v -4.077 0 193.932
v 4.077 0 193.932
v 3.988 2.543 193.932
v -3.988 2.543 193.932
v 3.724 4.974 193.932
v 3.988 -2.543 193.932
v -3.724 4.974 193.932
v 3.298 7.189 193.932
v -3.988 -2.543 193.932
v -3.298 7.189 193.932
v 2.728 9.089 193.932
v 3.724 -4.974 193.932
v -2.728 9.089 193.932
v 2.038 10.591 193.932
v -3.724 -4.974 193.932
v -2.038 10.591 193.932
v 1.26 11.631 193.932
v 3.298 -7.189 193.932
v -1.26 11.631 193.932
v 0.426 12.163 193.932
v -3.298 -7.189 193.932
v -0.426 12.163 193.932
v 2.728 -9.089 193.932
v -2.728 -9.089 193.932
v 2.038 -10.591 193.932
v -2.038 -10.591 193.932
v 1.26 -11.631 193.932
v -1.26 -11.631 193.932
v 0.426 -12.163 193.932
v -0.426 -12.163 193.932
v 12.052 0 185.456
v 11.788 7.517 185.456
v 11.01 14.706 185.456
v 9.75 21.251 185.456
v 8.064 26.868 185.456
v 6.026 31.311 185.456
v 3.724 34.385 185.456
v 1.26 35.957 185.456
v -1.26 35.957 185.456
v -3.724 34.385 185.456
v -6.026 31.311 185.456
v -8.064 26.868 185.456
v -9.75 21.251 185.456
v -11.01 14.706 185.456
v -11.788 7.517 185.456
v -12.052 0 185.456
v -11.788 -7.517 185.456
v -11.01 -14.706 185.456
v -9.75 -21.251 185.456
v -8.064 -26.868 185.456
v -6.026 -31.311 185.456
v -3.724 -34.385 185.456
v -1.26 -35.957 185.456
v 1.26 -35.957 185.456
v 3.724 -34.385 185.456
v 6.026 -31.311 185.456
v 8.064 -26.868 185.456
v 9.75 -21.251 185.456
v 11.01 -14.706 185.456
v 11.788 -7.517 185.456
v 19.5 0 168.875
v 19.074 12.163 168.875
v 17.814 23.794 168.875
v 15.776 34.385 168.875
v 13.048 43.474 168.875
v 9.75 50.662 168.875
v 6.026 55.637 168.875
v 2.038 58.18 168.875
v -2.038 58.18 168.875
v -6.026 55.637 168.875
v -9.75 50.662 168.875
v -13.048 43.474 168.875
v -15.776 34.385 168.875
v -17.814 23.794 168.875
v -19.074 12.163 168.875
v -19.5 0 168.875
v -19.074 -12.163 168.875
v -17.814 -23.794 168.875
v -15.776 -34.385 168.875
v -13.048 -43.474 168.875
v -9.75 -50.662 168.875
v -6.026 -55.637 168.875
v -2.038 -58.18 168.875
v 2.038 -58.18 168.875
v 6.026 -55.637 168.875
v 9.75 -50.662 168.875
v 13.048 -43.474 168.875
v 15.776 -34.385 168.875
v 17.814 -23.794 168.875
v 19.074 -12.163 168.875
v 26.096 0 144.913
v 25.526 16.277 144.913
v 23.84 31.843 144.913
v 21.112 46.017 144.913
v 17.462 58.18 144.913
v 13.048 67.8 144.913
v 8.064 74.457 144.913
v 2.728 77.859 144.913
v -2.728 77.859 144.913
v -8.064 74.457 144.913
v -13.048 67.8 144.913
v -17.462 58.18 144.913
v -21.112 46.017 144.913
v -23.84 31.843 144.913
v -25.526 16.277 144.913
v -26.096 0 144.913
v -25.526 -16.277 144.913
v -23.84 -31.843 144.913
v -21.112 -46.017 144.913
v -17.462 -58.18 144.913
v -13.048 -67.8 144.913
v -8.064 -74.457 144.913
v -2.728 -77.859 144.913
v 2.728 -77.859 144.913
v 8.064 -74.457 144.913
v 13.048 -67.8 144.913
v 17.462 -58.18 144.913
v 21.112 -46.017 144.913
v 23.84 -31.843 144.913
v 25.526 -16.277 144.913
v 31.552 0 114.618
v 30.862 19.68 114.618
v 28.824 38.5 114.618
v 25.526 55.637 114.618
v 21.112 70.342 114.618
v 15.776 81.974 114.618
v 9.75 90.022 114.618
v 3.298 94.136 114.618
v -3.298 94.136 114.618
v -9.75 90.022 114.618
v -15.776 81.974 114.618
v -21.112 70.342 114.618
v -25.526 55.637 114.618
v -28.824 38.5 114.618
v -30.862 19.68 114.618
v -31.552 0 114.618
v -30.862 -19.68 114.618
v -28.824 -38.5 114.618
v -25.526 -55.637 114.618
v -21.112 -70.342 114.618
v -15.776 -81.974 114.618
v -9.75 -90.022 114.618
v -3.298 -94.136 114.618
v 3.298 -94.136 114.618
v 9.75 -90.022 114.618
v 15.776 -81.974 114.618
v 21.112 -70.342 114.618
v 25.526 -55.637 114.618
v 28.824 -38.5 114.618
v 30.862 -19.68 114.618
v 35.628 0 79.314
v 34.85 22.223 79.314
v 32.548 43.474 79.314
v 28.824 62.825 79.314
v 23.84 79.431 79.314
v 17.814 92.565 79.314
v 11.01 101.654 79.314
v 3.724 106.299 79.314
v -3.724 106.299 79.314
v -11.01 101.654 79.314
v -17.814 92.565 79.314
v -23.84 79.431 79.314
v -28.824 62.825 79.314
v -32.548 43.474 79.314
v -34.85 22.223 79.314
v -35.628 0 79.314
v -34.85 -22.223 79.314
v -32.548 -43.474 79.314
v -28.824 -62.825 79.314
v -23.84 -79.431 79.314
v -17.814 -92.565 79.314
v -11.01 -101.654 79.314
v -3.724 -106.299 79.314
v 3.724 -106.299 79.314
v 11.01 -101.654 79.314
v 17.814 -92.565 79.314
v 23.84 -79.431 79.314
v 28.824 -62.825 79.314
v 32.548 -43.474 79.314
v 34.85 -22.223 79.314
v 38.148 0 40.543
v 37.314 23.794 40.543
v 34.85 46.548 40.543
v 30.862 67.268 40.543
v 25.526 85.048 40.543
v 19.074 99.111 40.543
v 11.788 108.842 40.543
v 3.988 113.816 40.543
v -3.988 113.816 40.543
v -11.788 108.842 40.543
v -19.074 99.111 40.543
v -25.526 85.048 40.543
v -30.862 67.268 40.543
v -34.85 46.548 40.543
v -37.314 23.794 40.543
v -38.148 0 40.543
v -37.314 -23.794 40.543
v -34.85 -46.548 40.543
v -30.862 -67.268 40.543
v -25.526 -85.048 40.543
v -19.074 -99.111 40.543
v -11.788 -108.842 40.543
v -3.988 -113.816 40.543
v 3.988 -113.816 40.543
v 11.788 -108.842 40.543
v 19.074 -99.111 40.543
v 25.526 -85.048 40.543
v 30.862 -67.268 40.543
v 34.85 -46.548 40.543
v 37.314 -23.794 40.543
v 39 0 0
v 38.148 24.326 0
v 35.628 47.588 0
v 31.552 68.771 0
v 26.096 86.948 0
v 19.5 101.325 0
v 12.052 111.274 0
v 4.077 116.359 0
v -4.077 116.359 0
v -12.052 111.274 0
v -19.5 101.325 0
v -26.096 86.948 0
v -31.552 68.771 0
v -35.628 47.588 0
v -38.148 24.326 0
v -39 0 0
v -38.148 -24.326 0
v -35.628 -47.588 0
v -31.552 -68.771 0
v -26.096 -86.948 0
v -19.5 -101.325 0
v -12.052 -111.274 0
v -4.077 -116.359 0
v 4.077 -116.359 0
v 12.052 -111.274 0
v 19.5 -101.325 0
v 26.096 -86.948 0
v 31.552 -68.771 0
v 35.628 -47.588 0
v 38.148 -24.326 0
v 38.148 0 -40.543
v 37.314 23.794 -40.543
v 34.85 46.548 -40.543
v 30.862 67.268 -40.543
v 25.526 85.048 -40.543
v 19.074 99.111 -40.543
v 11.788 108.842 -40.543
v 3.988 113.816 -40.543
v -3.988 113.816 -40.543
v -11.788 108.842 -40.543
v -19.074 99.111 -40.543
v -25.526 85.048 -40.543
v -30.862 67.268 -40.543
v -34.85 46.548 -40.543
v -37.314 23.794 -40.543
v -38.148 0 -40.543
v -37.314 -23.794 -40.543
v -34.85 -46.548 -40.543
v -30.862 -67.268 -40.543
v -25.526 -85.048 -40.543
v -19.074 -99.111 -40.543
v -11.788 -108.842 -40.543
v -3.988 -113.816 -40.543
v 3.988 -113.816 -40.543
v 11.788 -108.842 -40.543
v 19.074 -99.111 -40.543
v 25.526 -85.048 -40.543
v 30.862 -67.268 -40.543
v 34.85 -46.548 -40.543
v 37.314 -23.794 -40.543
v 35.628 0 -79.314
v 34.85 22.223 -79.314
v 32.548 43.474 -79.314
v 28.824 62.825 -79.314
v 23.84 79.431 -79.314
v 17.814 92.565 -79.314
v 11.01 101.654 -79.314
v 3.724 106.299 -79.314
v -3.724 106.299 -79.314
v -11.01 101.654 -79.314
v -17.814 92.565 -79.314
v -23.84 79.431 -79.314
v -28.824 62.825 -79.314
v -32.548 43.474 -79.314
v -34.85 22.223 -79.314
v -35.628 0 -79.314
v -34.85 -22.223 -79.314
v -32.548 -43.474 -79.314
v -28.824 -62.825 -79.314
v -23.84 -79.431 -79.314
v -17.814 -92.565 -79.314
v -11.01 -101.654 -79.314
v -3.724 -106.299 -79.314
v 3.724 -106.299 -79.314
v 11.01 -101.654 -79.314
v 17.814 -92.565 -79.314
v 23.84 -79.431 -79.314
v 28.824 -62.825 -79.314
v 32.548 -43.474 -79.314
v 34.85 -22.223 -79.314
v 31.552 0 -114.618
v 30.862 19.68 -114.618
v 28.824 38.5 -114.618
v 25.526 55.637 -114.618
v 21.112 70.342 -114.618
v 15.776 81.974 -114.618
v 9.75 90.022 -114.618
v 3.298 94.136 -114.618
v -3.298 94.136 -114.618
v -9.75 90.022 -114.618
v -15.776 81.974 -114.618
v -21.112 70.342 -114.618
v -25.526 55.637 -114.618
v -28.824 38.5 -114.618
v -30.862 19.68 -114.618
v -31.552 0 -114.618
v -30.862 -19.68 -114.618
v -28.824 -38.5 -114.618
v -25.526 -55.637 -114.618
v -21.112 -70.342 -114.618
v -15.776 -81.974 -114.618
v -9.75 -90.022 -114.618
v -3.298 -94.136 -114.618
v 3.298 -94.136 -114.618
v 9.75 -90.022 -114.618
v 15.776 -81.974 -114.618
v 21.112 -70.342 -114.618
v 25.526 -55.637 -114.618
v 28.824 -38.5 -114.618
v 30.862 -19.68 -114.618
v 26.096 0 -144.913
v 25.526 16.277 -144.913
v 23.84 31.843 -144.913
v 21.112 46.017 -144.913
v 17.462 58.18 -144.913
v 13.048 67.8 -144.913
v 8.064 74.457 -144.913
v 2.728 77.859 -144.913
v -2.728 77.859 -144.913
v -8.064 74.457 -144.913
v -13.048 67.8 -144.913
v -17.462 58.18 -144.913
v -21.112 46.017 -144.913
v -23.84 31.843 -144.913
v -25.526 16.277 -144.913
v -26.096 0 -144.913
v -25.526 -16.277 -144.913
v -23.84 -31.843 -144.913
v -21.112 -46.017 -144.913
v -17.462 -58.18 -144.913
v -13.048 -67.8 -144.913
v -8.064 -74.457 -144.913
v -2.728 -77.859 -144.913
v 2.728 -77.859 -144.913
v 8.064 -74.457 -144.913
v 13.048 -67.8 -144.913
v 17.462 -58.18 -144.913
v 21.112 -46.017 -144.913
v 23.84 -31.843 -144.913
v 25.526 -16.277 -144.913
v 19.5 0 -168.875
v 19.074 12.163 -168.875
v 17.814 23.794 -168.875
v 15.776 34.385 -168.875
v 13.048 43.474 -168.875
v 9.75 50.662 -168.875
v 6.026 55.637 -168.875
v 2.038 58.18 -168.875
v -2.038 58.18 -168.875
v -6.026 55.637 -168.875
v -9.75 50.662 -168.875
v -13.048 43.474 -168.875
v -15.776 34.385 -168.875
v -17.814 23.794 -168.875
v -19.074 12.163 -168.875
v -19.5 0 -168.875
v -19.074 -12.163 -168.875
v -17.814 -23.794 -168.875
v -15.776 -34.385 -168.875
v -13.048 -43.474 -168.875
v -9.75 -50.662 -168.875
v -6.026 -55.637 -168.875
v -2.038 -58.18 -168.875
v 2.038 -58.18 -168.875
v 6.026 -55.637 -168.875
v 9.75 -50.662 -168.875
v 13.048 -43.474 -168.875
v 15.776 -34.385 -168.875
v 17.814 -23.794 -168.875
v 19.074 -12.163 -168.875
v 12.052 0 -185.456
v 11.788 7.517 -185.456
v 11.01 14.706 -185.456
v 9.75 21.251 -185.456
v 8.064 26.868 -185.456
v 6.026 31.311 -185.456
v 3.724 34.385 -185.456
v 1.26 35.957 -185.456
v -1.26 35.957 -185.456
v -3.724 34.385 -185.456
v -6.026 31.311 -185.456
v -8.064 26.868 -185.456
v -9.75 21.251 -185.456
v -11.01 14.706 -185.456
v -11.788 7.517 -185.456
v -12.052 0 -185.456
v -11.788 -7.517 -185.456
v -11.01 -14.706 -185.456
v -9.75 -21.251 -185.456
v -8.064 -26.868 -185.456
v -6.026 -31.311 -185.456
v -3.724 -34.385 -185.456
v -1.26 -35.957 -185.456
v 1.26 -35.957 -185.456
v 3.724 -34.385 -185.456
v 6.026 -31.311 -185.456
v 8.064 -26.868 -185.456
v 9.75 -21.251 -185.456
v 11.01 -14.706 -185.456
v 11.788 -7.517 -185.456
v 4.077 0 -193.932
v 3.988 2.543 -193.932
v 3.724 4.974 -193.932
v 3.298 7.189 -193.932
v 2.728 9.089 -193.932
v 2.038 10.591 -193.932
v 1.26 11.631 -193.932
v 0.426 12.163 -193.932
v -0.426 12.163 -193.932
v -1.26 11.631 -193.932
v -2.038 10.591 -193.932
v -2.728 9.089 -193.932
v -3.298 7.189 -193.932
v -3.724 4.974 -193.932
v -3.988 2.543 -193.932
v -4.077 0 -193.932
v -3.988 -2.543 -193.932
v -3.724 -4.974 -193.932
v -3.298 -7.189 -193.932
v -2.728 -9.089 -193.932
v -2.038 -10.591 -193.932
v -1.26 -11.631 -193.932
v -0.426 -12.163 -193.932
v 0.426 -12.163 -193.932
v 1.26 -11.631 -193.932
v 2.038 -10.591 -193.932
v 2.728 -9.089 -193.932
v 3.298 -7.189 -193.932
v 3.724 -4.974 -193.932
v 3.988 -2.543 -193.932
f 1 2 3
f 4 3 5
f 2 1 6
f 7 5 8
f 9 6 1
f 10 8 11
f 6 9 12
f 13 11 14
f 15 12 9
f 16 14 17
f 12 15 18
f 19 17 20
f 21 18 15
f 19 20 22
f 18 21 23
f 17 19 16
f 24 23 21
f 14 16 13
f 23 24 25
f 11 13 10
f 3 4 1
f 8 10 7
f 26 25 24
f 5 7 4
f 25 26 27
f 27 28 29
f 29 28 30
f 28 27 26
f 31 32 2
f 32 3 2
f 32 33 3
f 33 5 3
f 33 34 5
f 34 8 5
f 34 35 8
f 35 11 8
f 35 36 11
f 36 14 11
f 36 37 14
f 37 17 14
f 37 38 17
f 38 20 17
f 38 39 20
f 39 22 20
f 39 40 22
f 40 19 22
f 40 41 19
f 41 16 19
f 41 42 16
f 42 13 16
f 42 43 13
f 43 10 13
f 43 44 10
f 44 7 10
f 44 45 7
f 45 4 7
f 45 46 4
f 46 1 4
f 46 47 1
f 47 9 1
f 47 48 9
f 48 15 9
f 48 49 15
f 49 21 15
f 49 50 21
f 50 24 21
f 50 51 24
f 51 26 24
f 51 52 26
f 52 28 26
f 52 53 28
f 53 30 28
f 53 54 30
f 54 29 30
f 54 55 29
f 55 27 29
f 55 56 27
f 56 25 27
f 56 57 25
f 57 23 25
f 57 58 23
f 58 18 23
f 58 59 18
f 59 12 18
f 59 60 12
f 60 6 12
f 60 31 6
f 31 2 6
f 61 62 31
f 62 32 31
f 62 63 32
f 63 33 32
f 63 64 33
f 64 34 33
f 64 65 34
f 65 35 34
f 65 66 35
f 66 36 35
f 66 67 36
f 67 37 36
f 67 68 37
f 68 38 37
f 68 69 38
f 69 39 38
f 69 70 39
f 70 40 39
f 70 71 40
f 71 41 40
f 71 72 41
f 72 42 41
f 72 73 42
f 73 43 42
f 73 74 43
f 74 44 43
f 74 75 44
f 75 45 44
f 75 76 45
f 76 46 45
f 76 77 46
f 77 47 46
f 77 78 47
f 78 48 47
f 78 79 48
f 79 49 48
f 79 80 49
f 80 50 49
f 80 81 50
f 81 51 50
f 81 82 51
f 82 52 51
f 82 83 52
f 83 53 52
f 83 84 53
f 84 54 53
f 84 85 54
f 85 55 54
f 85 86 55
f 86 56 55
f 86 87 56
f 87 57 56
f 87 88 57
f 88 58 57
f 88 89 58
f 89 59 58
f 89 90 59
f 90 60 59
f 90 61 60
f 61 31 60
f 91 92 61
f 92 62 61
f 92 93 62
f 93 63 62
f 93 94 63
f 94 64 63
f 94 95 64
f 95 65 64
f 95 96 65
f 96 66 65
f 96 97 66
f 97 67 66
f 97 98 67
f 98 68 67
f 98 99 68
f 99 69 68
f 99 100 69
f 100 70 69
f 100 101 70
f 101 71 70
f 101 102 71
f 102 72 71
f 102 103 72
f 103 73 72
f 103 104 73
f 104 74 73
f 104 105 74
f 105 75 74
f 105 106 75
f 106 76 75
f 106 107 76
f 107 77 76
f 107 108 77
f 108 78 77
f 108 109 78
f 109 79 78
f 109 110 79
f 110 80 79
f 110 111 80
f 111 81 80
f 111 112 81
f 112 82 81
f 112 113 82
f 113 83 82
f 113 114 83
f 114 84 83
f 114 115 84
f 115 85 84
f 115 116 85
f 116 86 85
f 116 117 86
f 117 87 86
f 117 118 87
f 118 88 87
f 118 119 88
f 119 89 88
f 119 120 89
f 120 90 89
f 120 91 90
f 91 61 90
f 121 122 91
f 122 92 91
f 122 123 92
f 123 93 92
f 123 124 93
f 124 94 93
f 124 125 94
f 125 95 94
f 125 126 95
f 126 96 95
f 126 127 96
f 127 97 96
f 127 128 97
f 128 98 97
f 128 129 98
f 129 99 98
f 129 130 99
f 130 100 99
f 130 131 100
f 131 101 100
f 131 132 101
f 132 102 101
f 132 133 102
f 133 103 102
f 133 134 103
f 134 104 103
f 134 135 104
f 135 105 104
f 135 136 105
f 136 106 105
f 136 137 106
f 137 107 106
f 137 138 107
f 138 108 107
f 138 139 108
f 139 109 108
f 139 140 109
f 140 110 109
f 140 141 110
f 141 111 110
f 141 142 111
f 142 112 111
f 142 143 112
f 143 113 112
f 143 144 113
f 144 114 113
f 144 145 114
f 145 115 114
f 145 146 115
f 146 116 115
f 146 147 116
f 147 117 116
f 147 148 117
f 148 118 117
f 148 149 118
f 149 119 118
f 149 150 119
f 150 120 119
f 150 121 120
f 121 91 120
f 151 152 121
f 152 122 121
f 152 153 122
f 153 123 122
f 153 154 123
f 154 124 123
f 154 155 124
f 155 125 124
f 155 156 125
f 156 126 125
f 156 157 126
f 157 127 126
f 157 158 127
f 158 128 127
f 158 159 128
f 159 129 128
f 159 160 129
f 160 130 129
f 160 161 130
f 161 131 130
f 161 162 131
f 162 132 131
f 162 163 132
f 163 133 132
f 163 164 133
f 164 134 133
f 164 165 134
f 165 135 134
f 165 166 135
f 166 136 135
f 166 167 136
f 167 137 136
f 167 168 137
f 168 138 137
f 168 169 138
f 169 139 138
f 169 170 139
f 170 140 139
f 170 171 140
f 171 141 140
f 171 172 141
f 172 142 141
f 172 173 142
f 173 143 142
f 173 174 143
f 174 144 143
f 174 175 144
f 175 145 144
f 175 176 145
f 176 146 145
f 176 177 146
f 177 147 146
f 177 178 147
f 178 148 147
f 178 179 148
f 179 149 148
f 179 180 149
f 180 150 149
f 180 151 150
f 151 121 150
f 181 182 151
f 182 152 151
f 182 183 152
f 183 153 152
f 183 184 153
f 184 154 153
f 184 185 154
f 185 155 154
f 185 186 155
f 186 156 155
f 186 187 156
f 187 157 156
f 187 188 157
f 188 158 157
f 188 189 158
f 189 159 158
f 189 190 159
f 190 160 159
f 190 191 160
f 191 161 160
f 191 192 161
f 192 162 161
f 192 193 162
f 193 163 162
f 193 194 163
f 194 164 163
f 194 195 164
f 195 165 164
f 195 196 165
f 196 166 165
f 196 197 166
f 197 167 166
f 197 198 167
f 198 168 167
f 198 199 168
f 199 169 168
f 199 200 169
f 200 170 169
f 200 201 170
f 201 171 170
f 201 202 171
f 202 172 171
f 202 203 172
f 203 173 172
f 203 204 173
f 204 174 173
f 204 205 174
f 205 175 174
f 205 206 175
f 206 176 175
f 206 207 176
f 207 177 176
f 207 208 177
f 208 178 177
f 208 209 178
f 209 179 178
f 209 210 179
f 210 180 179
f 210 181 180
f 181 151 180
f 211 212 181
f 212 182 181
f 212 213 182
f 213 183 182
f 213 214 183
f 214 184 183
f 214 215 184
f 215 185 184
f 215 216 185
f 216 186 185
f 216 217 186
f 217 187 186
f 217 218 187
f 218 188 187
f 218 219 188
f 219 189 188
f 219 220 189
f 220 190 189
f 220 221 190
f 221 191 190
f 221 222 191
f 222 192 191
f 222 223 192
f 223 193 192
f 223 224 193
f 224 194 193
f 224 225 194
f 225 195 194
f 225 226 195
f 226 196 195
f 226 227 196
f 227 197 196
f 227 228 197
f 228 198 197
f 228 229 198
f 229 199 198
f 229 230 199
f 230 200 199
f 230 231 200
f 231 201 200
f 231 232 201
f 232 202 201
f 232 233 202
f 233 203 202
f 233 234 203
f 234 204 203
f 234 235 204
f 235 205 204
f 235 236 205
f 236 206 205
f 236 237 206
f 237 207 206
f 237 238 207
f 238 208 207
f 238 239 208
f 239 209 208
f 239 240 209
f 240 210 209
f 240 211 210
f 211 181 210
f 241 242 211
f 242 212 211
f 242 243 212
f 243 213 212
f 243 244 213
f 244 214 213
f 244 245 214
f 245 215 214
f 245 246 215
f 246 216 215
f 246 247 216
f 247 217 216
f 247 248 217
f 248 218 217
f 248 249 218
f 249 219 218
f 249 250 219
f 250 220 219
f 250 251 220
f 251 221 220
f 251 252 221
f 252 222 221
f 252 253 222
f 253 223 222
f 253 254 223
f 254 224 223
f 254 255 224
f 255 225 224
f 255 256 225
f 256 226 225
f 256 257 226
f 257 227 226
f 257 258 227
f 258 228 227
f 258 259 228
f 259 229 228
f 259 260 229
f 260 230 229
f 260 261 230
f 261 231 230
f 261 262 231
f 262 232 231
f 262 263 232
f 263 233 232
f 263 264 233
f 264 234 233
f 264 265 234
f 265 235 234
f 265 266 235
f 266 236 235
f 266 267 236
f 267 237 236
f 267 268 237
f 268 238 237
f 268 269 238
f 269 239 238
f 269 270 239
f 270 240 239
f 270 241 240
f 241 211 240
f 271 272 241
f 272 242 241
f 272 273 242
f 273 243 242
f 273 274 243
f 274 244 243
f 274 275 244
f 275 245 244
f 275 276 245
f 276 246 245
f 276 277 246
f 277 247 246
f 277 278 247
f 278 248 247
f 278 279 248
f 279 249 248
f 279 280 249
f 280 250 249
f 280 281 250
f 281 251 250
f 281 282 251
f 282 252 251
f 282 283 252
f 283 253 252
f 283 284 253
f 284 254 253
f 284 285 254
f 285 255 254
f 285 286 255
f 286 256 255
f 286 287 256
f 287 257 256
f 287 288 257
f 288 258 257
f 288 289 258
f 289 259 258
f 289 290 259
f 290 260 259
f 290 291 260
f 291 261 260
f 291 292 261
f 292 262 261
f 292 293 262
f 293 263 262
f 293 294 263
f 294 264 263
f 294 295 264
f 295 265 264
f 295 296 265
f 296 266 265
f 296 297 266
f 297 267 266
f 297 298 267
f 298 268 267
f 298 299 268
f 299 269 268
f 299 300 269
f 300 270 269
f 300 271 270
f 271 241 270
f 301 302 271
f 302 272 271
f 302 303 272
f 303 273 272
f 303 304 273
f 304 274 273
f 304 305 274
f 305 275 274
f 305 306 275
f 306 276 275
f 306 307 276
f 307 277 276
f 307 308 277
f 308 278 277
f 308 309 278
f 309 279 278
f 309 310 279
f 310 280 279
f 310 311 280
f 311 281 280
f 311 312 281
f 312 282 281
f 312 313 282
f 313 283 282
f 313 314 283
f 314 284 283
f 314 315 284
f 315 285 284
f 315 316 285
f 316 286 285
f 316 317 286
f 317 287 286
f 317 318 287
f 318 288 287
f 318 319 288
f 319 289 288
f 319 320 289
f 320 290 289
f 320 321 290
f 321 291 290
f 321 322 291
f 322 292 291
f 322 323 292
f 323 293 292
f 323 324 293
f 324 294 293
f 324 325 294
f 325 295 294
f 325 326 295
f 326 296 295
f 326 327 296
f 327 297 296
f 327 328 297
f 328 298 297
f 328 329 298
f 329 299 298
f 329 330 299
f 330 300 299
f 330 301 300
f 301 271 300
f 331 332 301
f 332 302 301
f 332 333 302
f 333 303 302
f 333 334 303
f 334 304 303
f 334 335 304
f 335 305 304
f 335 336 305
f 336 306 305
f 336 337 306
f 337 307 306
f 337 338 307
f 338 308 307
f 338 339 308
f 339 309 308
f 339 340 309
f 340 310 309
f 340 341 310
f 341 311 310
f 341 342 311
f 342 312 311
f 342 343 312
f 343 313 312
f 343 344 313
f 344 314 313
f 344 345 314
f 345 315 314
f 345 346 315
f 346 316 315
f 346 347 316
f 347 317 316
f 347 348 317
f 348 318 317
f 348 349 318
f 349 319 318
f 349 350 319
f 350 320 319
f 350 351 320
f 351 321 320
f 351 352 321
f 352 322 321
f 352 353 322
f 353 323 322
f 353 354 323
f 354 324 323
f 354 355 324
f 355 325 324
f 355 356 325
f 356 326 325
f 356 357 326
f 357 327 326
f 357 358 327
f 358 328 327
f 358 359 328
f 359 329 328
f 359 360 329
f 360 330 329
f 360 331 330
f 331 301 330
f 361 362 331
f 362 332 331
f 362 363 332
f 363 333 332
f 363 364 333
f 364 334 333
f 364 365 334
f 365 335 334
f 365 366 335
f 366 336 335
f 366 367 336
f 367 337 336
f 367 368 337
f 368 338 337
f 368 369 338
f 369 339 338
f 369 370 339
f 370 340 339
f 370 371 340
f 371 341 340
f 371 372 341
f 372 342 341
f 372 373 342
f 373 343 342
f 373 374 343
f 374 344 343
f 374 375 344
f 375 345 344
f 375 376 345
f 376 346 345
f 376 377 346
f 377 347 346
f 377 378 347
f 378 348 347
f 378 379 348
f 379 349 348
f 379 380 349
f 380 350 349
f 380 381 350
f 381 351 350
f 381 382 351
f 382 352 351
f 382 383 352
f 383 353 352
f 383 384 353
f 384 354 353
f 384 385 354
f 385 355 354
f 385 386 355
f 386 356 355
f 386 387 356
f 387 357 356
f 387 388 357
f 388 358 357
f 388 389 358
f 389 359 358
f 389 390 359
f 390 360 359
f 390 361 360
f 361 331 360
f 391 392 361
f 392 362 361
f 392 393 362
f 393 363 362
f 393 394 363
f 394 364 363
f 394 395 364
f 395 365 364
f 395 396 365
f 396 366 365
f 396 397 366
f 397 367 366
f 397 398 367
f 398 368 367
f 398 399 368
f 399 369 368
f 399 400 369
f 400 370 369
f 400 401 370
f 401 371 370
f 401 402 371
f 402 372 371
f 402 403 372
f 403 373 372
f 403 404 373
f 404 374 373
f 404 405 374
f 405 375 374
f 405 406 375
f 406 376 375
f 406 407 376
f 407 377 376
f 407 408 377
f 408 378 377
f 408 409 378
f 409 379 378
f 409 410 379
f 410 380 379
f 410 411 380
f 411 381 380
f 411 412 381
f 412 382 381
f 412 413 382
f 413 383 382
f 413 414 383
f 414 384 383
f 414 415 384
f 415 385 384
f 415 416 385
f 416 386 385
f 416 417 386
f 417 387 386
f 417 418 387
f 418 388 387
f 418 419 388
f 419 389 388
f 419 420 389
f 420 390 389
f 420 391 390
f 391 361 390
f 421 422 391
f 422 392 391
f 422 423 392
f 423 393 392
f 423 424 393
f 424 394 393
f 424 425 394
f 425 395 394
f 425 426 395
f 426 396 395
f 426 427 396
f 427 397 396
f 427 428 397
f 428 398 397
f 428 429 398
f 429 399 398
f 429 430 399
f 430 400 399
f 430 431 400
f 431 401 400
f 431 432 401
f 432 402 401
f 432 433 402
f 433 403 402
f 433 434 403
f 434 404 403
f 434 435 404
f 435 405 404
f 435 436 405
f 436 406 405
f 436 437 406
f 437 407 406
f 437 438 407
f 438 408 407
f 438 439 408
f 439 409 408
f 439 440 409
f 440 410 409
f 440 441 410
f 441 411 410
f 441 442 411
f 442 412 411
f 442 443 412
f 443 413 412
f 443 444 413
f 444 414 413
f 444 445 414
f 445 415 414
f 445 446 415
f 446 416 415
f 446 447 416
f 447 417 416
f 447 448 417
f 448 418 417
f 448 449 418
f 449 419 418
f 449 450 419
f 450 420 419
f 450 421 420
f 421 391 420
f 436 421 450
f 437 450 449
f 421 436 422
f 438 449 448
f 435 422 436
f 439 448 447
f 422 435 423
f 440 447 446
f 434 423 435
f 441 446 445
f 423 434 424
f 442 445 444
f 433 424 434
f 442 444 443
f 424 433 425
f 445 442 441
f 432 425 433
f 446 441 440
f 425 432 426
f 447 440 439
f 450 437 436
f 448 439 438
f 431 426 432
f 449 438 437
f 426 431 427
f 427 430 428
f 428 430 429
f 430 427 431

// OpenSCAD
// Generated by SolidPython 1.0.1 on 2020-07-29 00:46:45


scale(v = [3, 9, 15]) {
	sphere(r = 13);
}
/***********************************************
*********      SolidPython code:      **********
************************************************
 
# import packages: SolidPython
from solid import *
from solid.utils import *
from itertools import chain, combinations, permutations


class Resize:

    def __init__(self, scad_file):
        self.scad_file = scad_file
        #self.scad_file = import_scad(scad_file)
        # cone/cylinder param:
        self.r1 = 0
        self.r2 = 0
        self.h = 0
        # rectangular prism param:
        self.w = 0
        self.l = 0
        # ellipse param:
        self.r = 0

    # import OpenScad code (file name corresponds to shape)


    # classify shape + parameters
    def assign(self, param1, param2, param3):
        if self.scad_file == 'cone.scad':
            self.r1 = param1
            self.r2 = param2
            self.h = param3
        elif self.scad_file == 'cylinder.scad':
            self.r1 = param1
            self.r2 = param2
            self.h = param3
        elif self.scad_file == 'rectangularPrism.scad':
            self.h = param1
            self.l = param2
            self.w = param3
        else:
            self.r = param1
            self.h = param2

    # resize parameters
    def iterate(self):
        x = range(3, 20, 2)
        i = 1
        if self.scad_file == 'cone.scad':
            tempList = list(permutations(x, 2))
            for temp in tempList:
                param1 = temp[0]
                param2 = temp[1]
                filepath = 'produced_scad_files/' + 'cone' + str(param1) + '_' + str(param2) + '_' + '.scad'
                scad_render_to_file(cylinder(h=param1, r1=param2, r2=0), filepath)

        elif self.scad_file == 'cylinder.scad':
            tempList = list(permutations(x, 3))
            for temp in tempList:
                param1 = temp[0]
                param2 = temp[1]
                filepath = 'produced_scad_files/' + 'cylinder' + str(param1) + '_' + str(param2) + '_' + '.scad'
                scad_render_to_file(cylinder(h=param1, r1=param2, r2=param2), filepath)

        elif self.scad_file == 'rectangularPrism.scad':
            tempList = list(permutations(x, 3))
            for temp in tempList:
                param1 = temp[0]
                param2 = temp[1]
                param3 = temp[2]
                filepath = 'produced_scad_files/' + 'rectangularPrism' + str(param1) + '_' + str(param2) + '_' + str(
                    param3) + '.scad'
                scad_render_to_file(cube(size=(param1, param2, param3)), filepath)

        elif self.scad_file == 'ellipse.scad':
            tempList = list(permutations(x, 4))
            for temp in tempList:
                param1 = temp[0]
                param2 = temp[1]
                param3 = temp[2]
                param4 = temp[3]
                filepath = 'produced_scad_files/' + 'ellipse' + str(param1) + '_' + str(param2) + '_' + str(param3) + '_' + str(param4) + '.scad'
                scad_render_to_file(scale([param1, param2, param3])(sphere(r=param4)), filepath)

    def render_to_scadfile(self):
        scad_render_to_file(scad, 'example.scad') 
 
************************************************/
